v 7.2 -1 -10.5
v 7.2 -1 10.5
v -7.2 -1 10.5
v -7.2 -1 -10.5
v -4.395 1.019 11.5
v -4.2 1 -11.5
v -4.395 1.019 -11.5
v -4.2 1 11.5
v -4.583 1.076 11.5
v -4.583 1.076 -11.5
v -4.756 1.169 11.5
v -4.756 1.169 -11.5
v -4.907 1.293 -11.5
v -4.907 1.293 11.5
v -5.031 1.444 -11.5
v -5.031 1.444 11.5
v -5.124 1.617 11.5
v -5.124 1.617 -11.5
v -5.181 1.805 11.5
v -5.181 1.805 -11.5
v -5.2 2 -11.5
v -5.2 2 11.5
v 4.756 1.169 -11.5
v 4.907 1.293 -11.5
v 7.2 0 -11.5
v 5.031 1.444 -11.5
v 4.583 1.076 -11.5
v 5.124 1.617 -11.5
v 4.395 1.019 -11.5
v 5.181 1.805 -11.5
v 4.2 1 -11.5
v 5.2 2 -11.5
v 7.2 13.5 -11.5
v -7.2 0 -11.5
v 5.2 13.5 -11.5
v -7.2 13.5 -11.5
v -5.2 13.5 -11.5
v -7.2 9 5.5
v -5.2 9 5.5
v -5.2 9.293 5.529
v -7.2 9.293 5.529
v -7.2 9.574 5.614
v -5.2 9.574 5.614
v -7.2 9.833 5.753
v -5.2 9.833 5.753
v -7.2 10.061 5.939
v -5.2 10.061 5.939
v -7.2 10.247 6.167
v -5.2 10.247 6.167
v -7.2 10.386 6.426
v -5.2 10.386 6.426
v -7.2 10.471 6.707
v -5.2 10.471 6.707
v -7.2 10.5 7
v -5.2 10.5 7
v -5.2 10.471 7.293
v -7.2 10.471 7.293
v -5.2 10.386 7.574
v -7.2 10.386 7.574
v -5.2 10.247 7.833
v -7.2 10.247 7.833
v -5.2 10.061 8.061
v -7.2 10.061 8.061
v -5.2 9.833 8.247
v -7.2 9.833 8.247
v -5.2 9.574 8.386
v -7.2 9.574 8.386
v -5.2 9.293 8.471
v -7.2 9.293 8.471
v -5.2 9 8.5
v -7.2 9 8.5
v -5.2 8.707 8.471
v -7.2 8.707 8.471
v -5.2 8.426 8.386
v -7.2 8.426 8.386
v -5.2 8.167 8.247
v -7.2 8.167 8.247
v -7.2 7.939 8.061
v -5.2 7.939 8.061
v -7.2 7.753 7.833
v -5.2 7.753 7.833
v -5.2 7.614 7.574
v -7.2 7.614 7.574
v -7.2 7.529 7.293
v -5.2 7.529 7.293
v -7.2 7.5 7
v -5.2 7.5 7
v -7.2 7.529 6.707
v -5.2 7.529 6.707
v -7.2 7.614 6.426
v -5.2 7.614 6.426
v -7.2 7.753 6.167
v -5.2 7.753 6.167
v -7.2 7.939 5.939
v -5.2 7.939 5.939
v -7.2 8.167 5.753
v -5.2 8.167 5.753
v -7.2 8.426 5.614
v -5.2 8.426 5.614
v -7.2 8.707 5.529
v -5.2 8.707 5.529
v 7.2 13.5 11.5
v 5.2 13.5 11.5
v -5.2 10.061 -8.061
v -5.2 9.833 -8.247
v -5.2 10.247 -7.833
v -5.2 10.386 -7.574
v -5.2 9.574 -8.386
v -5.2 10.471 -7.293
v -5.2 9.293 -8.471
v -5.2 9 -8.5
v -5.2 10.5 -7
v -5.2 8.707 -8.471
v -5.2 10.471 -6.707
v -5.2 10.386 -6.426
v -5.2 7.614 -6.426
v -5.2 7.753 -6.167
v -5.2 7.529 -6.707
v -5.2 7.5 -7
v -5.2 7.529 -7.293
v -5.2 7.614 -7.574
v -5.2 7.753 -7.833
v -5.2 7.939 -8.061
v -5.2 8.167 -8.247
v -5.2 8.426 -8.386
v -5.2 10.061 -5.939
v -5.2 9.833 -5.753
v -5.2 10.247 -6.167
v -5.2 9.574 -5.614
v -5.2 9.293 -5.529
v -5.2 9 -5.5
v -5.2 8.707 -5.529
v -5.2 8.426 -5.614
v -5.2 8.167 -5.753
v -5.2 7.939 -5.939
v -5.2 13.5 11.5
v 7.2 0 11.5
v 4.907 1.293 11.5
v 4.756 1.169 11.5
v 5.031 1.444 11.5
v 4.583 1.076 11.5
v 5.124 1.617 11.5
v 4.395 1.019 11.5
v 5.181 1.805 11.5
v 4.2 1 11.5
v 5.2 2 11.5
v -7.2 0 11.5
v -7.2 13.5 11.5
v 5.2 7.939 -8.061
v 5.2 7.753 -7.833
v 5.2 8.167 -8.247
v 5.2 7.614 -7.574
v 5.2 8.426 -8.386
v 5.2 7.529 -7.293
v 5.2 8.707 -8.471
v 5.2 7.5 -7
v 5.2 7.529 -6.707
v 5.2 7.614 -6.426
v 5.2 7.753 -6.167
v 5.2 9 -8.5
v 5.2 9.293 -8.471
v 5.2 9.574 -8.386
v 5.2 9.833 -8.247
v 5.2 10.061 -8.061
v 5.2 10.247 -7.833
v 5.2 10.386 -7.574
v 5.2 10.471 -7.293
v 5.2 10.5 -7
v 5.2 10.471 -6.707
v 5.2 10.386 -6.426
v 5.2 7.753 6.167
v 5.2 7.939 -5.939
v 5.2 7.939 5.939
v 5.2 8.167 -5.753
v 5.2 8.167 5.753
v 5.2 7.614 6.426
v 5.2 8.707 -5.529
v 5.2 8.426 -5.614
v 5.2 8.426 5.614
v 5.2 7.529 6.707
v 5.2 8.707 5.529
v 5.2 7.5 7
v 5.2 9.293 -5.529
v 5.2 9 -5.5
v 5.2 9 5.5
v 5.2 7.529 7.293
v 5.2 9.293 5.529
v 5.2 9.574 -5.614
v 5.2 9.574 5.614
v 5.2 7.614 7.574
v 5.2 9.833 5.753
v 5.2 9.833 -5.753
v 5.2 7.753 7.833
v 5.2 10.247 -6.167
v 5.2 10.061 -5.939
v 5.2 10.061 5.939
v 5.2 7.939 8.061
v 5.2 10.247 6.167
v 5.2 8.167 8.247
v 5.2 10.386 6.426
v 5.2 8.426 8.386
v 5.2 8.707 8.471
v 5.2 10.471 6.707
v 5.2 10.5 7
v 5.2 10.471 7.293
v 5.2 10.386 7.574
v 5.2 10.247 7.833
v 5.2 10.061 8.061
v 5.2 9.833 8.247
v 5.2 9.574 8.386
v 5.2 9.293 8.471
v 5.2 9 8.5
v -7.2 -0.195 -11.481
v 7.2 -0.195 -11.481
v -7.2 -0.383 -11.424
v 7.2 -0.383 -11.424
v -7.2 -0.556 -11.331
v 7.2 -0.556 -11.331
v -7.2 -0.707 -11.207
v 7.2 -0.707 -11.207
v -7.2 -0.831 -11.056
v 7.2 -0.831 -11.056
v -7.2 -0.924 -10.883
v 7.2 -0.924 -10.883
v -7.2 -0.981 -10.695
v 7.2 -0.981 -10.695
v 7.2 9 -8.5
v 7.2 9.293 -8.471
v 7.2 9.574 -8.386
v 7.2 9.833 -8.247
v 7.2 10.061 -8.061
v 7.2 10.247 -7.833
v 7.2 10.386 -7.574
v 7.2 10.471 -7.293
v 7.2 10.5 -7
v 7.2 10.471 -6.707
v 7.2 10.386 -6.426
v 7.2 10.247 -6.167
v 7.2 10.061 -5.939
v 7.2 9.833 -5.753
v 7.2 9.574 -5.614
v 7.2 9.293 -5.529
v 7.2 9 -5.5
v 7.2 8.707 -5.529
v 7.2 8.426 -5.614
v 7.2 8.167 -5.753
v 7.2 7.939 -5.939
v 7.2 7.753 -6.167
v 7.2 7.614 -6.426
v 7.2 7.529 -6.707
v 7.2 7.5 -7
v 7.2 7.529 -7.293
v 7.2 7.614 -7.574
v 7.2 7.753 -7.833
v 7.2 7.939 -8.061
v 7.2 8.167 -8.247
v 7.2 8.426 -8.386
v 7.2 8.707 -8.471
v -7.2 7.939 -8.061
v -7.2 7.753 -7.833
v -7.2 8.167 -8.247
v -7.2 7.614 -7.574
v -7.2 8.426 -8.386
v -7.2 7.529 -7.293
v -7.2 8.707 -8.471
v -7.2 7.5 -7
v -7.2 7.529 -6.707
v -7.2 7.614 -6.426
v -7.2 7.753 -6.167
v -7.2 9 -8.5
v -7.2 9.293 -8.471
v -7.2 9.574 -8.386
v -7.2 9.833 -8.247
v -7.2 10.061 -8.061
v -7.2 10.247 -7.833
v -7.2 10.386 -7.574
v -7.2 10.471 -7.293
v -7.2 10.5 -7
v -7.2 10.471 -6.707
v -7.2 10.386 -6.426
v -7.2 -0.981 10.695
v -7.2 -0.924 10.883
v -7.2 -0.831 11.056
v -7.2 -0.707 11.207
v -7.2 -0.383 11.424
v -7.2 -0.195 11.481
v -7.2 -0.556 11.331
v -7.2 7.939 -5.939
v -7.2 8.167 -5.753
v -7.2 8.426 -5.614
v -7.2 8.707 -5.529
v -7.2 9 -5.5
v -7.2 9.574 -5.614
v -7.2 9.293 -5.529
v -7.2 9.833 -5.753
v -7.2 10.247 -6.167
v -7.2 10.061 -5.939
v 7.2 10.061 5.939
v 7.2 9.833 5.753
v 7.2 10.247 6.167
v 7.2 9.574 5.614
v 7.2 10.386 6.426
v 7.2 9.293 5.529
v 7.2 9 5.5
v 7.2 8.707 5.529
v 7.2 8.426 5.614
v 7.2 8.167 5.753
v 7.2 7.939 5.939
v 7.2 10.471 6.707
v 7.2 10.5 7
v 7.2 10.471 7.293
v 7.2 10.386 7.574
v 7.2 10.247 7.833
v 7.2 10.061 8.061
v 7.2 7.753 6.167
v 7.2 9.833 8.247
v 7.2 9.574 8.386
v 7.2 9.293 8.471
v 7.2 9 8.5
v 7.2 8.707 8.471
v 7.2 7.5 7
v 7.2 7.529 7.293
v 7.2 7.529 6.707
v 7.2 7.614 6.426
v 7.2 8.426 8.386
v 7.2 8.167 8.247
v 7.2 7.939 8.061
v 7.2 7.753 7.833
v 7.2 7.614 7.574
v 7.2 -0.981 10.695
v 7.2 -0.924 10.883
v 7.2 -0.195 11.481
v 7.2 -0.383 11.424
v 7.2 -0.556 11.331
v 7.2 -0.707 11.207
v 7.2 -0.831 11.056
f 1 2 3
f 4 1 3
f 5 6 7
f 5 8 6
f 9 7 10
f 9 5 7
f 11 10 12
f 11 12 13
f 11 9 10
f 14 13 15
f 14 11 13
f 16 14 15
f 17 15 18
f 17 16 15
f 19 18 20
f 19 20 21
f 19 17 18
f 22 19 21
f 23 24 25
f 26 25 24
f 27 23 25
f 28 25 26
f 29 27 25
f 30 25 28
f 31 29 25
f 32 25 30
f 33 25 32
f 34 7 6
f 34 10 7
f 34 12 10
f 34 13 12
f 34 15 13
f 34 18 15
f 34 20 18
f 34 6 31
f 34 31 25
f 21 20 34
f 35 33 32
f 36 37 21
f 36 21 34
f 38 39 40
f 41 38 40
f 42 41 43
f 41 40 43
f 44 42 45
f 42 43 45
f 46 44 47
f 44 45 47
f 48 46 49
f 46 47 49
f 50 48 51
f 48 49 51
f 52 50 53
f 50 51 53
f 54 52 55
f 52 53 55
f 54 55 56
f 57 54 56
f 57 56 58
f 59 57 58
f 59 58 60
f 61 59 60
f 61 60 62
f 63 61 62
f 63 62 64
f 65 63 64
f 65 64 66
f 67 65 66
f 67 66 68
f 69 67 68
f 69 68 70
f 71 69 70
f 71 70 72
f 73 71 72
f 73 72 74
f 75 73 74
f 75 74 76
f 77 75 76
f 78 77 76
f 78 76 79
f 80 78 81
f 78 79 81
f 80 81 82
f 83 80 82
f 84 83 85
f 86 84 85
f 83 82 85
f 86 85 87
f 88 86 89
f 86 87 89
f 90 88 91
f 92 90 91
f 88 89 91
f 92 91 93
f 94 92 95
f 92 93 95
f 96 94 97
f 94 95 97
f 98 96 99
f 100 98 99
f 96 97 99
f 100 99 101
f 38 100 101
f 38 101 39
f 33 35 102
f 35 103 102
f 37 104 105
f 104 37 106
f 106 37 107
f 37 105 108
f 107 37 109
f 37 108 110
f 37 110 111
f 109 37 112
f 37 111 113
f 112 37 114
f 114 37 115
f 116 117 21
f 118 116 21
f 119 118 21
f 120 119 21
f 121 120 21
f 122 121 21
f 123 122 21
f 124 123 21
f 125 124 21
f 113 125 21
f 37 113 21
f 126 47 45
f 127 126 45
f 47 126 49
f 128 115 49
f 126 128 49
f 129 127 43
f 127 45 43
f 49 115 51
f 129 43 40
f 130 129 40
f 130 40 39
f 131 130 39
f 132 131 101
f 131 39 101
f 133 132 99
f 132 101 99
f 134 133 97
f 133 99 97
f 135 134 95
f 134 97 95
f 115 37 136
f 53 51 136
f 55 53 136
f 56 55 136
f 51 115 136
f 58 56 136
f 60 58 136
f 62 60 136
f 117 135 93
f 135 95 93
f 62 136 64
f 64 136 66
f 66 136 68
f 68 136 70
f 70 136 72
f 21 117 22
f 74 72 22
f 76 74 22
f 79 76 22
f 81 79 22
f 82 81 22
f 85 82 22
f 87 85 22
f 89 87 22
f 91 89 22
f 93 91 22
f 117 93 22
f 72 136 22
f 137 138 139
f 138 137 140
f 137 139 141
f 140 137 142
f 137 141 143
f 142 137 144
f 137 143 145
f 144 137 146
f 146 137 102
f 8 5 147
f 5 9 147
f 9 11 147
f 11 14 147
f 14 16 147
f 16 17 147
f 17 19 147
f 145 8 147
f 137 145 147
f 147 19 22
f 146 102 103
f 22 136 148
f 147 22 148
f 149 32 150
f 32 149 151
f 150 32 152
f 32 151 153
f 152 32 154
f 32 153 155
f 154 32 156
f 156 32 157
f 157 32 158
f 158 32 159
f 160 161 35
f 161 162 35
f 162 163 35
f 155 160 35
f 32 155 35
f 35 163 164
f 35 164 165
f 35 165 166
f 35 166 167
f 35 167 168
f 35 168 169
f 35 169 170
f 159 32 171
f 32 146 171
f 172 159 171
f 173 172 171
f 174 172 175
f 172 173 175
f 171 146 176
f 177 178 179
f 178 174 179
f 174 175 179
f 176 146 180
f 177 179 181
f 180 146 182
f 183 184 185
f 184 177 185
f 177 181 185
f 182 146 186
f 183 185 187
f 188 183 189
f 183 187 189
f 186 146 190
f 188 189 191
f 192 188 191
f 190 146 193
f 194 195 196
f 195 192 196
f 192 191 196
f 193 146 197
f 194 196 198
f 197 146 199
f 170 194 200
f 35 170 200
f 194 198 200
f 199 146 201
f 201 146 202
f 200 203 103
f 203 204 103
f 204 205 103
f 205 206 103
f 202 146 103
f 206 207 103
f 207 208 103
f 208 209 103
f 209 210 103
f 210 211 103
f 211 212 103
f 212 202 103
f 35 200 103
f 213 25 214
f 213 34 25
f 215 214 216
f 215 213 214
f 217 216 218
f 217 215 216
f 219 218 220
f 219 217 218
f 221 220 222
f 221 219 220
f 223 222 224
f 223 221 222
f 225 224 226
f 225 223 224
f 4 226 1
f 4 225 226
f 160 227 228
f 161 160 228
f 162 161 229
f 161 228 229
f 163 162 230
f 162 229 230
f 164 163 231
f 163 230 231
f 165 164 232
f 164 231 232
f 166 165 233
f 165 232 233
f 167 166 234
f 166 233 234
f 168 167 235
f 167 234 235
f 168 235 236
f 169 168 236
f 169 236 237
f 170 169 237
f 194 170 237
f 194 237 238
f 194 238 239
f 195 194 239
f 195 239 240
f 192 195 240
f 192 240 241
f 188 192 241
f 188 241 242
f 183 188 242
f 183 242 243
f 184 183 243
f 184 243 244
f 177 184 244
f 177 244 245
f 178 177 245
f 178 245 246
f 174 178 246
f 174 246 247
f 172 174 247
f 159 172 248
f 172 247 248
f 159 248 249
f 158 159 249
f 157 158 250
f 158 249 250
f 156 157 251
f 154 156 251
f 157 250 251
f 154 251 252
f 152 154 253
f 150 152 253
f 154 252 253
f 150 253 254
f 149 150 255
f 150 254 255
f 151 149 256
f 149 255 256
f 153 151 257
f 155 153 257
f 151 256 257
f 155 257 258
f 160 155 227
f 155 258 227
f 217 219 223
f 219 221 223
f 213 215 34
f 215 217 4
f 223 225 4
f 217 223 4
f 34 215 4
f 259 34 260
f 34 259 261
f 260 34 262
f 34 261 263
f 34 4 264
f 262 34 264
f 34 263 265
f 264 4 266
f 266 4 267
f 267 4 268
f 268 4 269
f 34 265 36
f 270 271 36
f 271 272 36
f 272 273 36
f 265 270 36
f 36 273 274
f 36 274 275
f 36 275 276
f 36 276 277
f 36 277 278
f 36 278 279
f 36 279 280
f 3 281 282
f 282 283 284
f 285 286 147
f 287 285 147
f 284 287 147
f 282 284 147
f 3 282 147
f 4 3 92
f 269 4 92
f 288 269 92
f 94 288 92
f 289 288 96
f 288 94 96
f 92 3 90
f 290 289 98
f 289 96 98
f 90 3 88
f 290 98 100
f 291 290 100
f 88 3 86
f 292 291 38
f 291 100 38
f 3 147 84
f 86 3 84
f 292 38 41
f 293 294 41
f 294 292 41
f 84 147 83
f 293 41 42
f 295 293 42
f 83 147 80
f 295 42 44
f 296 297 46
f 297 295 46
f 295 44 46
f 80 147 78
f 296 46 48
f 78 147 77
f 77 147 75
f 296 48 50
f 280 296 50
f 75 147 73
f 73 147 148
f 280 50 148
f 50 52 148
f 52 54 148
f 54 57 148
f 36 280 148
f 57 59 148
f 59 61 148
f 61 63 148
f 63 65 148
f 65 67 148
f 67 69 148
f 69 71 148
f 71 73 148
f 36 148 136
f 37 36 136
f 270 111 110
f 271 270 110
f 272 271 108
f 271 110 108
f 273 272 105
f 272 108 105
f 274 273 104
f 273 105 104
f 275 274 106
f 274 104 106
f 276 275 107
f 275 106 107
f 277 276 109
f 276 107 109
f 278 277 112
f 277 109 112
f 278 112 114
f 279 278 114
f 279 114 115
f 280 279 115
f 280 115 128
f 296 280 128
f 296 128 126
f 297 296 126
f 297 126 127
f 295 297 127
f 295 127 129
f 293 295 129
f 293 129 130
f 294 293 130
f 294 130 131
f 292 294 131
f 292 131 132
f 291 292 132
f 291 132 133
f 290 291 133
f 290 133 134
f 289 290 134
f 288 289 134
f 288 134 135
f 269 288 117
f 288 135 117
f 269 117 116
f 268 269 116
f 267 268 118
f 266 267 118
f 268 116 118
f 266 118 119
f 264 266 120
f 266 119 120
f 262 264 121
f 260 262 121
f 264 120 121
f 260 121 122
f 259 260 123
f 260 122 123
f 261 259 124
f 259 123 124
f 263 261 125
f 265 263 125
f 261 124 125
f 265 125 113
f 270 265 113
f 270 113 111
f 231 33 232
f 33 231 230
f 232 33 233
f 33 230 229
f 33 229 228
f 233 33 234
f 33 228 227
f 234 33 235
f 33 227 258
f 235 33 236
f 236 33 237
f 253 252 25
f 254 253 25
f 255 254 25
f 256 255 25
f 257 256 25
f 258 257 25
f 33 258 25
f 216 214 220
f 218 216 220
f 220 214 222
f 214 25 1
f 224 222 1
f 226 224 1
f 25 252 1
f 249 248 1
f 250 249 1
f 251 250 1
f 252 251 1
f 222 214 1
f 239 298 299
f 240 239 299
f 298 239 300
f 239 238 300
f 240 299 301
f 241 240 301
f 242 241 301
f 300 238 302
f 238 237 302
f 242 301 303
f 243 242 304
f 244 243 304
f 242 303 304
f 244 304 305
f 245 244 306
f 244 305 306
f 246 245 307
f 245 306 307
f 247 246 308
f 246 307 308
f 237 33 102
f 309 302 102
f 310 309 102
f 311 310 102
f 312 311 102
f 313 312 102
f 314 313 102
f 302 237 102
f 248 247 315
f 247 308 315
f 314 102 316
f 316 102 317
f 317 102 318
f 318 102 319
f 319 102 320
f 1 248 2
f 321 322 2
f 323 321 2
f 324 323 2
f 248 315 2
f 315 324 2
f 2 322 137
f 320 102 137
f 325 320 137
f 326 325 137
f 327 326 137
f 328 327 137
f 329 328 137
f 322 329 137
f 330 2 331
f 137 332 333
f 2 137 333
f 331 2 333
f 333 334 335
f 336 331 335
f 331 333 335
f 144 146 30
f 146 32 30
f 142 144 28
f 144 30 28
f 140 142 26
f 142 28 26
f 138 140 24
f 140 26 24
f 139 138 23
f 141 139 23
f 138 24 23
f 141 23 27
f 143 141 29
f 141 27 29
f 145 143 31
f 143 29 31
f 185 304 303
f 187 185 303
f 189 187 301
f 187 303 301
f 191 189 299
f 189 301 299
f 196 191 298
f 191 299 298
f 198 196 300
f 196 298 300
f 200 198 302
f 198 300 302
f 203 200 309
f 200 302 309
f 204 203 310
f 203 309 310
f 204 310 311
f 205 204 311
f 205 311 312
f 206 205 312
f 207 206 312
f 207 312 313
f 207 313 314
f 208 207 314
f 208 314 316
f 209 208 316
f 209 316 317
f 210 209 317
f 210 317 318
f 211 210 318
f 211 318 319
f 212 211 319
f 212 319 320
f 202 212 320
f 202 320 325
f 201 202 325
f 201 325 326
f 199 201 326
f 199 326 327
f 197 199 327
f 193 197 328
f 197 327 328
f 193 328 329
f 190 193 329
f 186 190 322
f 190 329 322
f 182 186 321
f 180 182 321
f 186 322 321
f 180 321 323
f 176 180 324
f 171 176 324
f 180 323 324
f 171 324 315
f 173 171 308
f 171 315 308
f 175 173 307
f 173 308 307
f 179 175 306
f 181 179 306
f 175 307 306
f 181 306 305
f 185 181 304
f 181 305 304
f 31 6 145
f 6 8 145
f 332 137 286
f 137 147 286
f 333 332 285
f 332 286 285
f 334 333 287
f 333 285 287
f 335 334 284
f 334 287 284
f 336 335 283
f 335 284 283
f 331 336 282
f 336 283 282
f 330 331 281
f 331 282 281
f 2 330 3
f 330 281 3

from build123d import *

# Parameters (mm, degrees)
BOSS_EXTRUDE1_DEPTH     = 11.5
SKETCH2_R               = 1.5
CUT_EXTRUDE1_DEPTH      = 1
CUT_EXTRUDE1_DEPTH_BACK = 15.4
FILLET1_R               = 1
FILLET2_R               = 1


with BuildPart() as part:
    # Sketch1 → Boss-Extrude1 (new body, symmetric)
    with BuildSketch(Plane.XY):
        Polygon((-5.2, 1), (5.2, 1), (5.2, 13.5), (7.2, 13.5), (7.2, -1), (-7.2, -1), (-7.2, 13.5), (-5.2, 13.5), align=None)
    extrude(amount=BOSS_EXTRUDE1_DEPTH, both=True)

    # Sketch2 → Cut-Extrude1 (cut, two sides)
    with BuildSketch(Plane(origin=(7.2, 0, 0), x_dir=(0, 0, -1), z_dir=(1, 0, 0))) as cut_extrude1_sk:
        with Locations((-7, 9)):
            Circle(SKETCH2_R)
        with Locations((7, 9)):
            Circle(SKETCH2_R)
    extrude(amount=CUT_EXTRUDE1_DEPTH, mode=Mode.SUBTRACT)
    extrude(cut_extrude1_sk.sketch, amount=-CUT_EXTRUDE1_DEPTH_BACK, mode=Mode.SUBTRACT)

    # Fillet1
    fillet1_edges = [part.edges().sort_by_distance(p)[0] for p in [
        (0, -1, -11.5),
        (0, -1, 11.5),
    ]]
    fillet(fillet1_edges, radius=FILLET1_R)

    # Fillet2
    fillet2_edges = [part.edges().sort_by_distance(p)[0] for p in [
        (-5.2, 1, 0),
        (5.2, 1, 0),
    ]]
    fillet(fillet2_edges, radius=FILLET2_R)


solid = part.part
